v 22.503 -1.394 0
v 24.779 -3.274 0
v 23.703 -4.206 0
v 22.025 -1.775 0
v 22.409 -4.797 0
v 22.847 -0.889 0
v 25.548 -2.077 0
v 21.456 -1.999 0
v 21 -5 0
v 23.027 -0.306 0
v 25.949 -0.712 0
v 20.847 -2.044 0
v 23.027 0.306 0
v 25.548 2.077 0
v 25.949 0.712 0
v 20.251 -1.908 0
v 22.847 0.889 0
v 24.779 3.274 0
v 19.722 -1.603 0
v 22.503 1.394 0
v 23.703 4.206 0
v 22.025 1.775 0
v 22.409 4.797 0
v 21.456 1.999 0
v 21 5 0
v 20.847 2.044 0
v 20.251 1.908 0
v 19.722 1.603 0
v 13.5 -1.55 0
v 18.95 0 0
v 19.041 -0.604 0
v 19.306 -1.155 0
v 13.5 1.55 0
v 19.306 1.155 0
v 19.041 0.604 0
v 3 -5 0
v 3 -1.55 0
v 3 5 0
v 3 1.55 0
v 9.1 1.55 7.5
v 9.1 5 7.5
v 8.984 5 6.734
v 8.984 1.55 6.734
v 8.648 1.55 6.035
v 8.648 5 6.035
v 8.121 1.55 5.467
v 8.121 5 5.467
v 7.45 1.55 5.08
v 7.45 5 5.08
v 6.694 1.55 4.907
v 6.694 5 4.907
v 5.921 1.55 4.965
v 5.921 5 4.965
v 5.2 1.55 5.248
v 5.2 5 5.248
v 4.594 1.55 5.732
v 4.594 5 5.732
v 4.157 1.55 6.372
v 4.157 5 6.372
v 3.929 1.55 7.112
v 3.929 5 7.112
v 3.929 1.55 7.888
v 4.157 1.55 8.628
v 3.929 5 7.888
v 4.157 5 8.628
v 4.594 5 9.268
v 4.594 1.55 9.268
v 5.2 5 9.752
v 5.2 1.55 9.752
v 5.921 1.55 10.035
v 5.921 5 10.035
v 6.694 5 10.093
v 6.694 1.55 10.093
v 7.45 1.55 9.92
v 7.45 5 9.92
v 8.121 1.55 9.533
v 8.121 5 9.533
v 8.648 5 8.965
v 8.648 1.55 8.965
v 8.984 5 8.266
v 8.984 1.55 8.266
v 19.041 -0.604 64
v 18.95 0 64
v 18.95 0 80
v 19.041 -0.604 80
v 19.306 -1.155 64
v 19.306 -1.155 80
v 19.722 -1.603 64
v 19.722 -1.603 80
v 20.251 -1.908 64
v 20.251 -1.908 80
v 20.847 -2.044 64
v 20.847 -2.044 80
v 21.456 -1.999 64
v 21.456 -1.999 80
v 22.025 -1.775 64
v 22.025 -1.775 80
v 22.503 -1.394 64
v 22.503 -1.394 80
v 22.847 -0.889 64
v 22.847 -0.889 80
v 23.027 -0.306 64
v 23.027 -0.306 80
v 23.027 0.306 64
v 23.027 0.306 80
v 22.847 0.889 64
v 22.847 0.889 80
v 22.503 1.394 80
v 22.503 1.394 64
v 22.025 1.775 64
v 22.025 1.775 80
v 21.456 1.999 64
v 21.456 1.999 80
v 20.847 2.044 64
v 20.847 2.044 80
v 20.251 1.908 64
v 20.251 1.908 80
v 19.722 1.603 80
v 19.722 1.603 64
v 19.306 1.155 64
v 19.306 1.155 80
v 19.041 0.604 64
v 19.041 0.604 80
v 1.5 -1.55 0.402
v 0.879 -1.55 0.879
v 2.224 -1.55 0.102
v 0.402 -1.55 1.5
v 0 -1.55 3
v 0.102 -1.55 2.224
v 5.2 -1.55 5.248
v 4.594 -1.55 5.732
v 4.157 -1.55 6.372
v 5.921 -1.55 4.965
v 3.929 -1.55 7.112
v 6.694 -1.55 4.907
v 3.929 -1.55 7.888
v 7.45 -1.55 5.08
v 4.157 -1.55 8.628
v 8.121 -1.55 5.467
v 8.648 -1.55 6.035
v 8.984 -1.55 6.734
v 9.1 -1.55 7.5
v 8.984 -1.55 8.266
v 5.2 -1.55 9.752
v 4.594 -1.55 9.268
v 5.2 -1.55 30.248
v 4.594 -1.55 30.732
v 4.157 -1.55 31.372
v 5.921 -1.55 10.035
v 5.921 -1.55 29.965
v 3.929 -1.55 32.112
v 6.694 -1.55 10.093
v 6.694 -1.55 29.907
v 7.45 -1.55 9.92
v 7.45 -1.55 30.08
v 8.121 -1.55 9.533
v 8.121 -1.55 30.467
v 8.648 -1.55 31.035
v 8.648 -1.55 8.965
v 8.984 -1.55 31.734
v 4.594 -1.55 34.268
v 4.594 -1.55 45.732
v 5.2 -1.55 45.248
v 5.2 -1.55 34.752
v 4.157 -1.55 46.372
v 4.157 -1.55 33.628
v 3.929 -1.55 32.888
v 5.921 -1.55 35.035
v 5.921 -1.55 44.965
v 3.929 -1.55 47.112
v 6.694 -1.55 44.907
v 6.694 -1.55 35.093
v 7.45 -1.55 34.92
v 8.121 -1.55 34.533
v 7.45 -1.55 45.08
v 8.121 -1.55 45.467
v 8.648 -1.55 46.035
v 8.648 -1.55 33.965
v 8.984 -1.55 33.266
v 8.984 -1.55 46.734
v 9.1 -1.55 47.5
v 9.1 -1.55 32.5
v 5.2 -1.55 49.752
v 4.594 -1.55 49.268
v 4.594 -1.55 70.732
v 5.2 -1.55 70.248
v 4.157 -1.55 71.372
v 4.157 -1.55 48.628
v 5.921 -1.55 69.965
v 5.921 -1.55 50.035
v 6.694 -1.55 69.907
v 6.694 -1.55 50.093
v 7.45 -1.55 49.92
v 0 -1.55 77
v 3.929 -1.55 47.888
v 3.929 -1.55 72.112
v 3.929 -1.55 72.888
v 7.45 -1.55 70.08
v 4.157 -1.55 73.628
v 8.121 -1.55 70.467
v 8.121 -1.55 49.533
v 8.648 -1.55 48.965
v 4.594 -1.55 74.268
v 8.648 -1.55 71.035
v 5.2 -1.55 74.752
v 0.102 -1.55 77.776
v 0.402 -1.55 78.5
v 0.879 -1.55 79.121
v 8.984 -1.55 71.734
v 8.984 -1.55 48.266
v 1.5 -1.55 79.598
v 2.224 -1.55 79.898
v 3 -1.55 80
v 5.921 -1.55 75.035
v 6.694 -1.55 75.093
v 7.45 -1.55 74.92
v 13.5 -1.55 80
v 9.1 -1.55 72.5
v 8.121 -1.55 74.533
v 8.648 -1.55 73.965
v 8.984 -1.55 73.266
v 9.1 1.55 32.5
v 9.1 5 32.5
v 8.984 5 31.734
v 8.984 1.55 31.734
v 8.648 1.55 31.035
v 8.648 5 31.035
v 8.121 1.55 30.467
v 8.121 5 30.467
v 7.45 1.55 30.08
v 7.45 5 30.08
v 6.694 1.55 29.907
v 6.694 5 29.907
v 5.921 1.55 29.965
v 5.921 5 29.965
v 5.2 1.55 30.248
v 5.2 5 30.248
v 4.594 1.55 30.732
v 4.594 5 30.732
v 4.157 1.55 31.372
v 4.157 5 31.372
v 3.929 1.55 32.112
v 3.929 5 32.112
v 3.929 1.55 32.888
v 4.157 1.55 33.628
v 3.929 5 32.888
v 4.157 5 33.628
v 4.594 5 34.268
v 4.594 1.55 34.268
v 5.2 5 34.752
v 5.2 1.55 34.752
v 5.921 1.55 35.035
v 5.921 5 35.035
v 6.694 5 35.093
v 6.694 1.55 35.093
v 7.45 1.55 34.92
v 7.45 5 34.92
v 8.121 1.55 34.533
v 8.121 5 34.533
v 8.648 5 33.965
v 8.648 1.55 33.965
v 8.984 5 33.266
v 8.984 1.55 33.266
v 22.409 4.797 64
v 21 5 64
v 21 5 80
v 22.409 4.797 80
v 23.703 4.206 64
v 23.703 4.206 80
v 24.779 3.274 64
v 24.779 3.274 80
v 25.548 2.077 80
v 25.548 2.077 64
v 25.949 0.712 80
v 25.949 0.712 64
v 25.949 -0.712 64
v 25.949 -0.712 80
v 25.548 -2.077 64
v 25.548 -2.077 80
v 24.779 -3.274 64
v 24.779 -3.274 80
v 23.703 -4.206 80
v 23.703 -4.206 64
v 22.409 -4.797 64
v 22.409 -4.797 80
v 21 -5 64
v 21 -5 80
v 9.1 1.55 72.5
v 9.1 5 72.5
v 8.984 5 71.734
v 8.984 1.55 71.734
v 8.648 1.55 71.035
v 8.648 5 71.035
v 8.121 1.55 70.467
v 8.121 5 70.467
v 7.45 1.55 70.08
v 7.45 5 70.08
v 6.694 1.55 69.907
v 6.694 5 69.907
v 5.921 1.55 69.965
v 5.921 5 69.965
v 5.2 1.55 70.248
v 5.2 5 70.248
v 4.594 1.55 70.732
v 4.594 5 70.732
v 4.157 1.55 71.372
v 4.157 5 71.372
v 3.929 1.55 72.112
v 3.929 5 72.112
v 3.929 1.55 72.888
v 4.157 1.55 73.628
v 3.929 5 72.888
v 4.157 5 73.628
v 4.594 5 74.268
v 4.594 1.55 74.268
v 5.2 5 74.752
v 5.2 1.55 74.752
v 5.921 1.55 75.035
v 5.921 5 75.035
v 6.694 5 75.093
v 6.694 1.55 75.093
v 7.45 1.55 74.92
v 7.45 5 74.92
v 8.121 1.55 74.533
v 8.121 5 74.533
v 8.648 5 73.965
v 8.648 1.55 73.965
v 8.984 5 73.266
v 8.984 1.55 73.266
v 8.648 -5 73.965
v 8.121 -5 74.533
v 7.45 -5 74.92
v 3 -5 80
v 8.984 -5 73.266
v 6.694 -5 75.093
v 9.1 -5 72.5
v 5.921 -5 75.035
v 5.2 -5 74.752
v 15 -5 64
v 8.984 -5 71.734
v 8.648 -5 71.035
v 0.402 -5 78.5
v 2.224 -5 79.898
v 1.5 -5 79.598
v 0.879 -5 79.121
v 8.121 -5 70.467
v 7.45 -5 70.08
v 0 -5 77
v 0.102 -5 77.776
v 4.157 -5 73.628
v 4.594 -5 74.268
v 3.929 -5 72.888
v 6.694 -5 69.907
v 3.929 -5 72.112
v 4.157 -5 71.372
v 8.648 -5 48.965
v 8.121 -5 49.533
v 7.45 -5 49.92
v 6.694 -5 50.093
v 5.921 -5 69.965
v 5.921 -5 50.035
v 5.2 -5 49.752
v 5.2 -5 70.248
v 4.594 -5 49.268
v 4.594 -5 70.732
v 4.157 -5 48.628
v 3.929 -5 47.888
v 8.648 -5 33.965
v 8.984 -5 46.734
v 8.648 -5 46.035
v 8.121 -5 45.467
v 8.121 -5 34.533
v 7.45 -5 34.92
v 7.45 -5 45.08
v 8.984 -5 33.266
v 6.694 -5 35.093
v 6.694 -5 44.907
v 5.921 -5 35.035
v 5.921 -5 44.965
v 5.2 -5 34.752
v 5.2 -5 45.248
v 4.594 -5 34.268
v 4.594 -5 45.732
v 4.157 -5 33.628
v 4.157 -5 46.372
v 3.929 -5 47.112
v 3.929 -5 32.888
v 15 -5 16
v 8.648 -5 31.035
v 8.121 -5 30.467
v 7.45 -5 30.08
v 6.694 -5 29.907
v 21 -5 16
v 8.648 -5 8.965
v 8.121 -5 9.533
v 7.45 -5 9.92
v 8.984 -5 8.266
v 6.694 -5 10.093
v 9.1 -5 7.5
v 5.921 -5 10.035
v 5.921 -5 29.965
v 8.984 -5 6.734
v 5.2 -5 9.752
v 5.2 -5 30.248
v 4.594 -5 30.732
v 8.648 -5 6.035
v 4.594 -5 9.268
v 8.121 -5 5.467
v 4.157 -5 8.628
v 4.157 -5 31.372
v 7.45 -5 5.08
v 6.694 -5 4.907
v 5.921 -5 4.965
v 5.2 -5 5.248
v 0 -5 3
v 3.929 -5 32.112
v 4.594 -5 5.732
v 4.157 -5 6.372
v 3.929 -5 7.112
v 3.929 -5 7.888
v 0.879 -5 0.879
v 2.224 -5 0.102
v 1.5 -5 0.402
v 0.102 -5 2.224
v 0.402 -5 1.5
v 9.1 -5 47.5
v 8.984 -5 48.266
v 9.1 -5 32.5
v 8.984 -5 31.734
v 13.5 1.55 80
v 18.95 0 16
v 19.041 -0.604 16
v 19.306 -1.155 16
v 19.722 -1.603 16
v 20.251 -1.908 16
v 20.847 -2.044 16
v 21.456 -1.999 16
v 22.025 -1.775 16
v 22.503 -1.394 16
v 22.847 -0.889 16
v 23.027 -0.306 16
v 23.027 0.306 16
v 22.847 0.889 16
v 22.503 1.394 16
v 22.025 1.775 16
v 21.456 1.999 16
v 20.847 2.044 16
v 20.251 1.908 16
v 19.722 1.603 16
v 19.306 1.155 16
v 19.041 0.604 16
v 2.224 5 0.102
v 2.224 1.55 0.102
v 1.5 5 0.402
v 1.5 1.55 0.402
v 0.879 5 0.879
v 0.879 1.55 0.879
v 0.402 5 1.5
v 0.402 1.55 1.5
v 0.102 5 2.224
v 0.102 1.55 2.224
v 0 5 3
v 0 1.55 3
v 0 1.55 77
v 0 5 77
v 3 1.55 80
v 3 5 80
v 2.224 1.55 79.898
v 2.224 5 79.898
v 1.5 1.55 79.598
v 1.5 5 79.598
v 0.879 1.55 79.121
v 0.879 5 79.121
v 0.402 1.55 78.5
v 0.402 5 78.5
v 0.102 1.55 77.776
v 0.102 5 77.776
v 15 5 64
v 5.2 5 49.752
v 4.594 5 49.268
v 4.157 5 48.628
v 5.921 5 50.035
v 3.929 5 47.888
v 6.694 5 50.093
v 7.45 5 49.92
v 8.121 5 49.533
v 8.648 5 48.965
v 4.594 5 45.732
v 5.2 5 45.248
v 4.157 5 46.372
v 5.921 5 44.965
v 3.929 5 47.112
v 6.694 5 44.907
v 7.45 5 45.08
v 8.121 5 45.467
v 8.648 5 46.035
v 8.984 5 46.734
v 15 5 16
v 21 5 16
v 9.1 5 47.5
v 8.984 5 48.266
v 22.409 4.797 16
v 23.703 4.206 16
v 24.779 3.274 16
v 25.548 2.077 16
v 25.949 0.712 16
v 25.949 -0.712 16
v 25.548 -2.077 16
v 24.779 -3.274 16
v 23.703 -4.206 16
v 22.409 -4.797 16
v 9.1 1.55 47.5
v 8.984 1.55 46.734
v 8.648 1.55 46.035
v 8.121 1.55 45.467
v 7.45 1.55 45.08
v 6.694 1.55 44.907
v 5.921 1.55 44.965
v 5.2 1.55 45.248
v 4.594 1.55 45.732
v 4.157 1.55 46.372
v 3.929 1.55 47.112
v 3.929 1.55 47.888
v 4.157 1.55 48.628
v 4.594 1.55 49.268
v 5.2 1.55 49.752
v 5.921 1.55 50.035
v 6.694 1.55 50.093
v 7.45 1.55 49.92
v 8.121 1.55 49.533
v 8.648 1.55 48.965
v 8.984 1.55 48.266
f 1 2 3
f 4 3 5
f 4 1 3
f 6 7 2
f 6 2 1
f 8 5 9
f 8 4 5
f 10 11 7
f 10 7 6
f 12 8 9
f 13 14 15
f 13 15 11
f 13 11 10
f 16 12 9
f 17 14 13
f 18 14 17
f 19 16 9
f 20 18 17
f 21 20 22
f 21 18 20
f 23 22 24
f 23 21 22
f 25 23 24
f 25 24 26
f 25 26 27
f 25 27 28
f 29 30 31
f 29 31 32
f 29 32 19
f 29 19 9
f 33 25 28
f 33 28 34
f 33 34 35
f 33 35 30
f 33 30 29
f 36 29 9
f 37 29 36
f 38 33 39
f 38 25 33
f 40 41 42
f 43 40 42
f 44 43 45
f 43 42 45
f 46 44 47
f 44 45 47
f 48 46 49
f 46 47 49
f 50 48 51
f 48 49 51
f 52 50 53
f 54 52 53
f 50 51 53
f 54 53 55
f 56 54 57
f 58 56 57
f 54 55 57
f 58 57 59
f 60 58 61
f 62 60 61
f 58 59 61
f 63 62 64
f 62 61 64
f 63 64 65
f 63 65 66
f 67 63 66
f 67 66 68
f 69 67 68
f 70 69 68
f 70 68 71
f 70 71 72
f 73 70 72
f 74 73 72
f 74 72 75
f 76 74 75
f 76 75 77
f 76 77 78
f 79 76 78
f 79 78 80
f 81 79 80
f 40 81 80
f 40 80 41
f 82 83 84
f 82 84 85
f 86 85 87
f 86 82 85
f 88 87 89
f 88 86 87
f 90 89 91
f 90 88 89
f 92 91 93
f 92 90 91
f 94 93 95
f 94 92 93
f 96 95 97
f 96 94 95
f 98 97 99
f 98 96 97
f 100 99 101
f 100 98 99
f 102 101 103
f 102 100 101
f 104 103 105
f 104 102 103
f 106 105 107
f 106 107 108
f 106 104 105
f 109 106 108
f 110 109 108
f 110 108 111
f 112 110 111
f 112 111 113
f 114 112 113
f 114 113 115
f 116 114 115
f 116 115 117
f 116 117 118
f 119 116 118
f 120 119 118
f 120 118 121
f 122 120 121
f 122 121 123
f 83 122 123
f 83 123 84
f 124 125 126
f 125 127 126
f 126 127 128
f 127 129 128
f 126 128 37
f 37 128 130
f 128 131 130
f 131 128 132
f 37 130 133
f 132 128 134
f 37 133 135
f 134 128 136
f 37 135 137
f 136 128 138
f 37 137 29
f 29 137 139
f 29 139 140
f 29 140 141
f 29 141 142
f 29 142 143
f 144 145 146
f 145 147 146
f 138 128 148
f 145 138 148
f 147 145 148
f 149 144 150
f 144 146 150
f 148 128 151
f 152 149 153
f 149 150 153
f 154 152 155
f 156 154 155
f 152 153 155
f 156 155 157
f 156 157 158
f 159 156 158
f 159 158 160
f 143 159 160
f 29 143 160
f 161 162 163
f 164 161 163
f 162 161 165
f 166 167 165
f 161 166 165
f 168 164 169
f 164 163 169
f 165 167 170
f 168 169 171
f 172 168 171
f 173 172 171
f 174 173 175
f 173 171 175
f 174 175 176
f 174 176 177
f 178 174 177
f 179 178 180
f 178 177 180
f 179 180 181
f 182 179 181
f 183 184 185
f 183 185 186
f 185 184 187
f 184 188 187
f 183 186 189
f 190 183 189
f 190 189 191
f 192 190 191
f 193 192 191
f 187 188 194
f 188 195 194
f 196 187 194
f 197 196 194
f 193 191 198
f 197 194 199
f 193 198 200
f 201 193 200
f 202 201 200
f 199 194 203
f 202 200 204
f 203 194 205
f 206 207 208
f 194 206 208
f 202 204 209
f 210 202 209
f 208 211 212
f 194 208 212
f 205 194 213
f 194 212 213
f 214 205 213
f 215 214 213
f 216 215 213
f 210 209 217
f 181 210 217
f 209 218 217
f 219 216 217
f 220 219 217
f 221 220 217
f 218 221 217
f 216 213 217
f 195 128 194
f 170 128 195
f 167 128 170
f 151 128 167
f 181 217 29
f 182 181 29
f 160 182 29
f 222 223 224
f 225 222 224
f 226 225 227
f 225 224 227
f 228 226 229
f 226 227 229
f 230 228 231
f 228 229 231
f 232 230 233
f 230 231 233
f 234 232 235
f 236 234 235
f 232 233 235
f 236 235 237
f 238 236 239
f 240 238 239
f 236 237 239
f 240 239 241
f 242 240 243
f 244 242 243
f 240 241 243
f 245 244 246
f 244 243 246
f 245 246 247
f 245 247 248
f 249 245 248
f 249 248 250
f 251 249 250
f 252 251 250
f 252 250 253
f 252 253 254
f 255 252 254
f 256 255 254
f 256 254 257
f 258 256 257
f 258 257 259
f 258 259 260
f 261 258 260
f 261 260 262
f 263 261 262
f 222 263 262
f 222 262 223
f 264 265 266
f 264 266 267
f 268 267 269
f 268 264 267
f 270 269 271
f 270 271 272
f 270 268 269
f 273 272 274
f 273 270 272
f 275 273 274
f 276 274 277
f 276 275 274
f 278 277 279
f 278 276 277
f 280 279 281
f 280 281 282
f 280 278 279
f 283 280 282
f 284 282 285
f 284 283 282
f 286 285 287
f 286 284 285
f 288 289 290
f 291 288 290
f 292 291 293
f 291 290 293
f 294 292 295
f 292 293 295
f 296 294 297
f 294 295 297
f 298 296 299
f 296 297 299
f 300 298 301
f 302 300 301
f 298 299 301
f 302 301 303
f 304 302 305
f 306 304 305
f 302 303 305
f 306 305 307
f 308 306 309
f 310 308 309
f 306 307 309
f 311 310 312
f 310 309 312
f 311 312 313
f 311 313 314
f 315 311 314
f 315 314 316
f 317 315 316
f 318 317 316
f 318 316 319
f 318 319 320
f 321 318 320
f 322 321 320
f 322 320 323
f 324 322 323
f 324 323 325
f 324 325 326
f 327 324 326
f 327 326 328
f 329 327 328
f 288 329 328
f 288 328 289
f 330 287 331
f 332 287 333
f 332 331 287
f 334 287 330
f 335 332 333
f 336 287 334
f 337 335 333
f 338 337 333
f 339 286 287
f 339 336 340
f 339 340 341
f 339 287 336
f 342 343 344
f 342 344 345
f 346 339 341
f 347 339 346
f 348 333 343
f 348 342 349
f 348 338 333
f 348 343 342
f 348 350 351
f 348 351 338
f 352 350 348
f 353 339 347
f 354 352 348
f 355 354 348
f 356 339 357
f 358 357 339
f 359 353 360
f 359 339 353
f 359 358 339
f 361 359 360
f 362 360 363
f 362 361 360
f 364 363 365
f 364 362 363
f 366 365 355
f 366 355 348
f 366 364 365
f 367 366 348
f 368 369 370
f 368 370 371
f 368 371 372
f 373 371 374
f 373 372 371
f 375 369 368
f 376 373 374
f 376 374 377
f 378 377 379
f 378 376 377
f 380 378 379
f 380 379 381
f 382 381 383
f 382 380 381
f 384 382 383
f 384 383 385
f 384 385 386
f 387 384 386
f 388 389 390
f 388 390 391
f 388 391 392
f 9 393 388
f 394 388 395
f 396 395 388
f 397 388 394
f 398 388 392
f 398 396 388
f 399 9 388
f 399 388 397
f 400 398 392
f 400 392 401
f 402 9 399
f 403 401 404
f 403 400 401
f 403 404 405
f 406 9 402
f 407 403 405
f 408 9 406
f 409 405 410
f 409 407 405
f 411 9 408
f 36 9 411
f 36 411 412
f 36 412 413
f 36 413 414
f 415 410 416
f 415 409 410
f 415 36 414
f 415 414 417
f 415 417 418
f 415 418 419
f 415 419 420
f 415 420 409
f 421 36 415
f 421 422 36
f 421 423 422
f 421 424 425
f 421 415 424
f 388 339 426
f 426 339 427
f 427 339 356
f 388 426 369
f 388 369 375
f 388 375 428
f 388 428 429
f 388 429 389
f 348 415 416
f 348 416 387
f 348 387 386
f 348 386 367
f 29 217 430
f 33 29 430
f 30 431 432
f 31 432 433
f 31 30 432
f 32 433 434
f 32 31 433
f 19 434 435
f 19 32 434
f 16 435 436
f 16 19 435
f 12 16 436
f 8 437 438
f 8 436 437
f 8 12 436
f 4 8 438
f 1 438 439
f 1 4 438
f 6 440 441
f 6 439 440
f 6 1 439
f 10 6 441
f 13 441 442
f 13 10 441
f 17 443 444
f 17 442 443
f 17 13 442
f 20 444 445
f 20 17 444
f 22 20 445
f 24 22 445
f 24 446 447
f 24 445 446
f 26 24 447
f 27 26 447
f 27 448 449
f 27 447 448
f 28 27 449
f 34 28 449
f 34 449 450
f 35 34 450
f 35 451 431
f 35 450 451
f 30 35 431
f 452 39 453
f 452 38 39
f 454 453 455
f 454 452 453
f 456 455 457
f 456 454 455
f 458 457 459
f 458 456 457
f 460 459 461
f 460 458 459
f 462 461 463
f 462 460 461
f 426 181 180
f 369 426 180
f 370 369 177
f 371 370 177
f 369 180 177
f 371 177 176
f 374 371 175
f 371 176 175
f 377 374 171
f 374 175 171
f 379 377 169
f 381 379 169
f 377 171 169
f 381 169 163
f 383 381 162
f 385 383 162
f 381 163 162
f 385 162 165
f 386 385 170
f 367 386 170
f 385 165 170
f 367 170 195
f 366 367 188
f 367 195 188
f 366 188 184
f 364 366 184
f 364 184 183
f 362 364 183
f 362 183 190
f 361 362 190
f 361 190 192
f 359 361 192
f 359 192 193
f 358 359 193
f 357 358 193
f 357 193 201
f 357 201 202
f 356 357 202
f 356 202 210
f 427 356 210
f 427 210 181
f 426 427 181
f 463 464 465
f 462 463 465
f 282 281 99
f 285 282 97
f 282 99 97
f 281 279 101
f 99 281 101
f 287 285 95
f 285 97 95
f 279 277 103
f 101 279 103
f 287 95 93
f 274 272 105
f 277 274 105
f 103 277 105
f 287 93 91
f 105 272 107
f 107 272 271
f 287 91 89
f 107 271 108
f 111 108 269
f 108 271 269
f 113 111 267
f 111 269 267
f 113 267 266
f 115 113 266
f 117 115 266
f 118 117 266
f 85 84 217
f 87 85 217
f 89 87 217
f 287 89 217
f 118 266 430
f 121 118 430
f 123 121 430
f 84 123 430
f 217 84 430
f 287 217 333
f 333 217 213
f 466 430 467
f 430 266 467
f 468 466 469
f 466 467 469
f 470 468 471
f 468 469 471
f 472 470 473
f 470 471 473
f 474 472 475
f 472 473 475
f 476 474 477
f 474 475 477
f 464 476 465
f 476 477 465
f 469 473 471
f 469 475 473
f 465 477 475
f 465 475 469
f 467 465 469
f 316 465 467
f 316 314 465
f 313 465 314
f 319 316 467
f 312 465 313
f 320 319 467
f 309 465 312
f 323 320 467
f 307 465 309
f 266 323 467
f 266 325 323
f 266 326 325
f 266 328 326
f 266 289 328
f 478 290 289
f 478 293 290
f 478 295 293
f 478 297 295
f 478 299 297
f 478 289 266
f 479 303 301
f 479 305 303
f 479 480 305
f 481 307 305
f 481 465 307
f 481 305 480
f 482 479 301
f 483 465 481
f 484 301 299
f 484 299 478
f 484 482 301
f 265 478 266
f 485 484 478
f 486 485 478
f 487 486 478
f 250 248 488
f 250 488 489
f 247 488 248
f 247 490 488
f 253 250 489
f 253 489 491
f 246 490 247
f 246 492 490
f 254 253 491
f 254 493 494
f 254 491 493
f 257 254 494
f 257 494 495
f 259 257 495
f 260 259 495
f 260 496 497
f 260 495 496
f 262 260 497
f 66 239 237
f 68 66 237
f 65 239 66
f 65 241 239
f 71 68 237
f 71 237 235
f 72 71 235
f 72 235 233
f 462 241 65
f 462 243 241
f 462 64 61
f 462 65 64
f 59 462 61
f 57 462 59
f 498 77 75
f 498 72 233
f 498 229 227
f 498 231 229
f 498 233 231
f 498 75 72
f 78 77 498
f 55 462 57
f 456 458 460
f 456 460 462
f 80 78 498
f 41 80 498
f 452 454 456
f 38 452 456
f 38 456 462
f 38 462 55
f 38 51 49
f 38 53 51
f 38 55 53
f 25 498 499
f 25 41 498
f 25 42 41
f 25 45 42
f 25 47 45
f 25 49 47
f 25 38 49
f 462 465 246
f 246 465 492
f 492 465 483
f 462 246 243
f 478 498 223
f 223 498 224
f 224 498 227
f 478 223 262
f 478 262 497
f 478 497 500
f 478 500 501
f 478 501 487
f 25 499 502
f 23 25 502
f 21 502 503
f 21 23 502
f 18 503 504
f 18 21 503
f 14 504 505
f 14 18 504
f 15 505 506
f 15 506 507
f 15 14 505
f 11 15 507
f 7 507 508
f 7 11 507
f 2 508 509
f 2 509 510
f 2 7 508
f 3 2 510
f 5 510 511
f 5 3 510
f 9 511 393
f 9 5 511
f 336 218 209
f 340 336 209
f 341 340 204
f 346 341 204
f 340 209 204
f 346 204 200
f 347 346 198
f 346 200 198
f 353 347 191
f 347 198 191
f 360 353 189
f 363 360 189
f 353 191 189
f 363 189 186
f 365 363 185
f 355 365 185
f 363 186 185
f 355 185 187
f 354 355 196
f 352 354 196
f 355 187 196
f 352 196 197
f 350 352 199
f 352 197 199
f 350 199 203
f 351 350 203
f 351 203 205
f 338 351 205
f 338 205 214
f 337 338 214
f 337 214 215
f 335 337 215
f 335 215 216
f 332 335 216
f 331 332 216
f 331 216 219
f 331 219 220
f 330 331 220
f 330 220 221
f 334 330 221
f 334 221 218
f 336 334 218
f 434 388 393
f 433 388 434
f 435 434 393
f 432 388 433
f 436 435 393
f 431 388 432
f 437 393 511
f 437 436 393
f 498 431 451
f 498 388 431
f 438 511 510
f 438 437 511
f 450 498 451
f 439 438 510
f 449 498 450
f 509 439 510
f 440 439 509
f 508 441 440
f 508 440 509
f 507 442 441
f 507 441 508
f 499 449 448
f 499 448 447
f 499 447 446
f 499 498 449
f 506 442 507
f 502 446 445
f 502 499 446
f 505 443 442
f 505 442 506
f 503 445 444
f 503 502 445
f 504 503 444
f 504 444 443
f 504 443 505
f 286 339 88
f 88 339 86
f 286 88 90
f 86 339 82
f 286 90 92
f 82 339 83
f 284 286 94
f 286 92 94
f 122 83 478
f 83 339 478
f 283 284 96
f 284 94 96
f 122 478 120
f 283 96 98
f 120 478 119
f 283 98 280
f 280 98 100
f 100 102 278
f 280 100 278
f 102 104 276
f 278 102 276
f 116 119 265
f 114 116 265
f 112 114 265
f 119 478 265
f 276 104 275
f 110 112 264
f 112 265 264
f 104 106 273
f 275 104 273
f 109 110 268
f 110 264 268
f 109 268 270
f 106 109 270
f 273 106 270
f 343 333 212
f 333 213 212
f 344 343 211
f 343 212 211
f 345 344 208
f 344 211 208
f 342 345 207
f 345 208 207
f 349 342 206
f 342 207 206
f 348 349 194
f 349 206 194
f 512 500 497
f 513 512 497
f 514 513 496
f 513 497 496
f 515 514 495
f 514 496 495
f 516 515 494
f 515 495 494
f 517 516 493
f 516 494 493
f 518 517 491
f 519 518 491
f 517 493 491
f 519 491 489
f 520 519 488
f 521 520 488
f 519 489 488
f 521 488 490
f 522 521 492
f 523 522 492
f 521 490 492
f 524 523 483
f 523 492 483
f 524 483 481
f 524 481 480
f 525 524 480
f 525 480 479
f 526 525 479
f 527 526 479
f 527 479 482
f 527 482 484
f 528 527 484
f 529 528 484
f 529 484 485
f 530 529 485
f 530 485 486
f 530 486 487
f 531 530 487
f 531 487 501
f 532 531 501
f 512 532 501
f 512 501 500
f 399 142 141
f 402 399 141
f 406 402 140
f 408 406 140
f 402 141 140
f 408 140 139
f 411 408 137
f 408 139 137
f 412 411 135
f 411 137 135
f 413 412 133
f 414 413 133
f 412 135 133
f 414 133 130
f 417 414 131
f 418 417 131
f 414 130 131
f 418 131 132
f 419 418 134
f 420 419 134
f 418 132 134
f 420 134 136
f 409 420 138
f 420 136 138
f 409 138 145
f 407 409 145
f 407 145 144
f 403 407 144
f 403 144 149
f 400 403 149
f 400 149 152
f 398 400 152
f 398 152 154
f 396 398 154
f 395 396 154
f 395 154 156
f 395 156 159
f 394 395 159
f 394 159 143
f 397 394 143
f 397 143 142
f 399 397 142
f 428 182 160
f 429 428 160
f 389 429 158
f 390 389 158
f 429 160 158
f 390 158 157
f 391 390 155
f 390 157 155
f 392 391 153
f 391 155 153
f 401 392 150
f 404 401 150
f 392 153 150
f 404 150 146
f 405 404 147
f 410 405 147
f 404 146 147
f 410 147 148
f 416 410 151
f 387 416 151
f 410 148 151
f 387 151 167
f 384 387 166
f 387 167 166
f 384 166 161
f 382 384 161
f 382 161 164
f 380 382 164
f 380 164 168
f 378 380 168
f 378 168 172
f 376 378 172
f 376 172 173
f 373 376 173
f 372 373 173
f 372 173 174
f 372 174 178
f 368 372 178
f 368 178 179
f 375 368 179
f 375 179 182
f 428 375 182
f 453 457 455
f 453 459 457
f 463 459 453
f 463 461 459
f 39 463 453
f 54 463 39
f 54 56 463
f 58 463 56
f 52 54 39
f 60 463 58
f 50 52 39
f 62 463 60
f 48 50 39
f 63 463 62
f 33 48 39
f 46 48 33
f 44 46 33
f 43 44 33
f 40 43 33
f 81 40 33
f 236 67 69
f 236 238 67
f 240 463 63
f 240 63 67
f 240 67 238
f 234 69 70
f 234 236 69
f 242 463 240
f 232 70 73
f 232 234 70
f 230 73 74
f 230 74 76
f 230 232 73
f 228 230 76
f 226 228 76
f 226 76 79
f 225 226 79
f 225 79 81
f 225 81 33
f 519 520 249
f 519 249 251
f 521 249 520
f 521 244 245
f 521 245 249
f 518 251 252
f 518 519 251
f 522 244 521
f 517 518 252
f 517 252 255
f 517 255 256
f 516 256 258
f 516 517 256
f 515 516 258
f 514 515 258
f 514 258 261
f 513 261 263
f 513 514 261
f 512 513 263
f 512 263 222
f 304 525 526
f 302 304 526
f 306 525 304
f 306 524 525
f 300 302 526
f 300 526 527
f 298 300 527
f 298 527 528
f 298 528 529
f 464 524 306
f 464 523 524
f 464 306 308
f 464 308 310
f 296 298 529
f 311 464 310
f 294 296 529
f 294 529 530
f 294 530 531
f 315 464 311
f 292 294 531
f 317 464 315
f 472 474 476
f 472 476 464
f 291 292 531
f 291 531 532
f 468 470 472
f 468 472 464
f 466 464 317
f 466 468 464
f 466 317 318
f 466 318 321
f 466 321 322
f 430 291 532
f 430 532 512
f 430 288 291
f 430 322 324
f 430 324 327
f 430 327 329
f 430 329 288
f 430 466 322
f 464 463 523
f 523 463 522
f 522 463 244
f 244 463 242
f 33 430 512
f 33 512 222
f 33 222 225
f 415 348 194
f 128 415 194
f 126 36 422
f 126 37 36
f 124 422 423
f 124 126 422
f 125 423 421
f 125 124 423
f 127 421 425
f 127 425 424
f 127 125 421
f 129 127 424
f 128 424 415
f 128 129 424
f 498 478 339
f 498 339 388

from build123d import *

# Parameters (mm, degrees)
SKETCH_1_R          = 2.05
EXTRUDE_1_DEPTH     = 80
SKETCH_2_W          = 13.5
SKETCH_2_H          = 3.1
CUT_EXTRUDE_1_DEPTH = 95
SKETCH_4_R          = 2.6
CUT_EXTRUDE_2_DEPTH = 20
SKETCH_5_W          = 32.115933716
SKETCH_5_H          = 48
CUT_EXTRUDE_5_DEPTH = 20
FILLET_1_R          = 3


with BuildPart() as part:
    # 草图1 → 凸台-拉伸1 (new body)
    with BuildSketch(Plane.XY):
        with BuildLine():
            Line((0, 5), (21, 5))
            ThreePointArc((21, 5), (26, 0), (21, -5))
            Line((21, -5), (0, -5))
            Line((0, -5), (0, 5))
        make_face()
        with Locations(Location((21, 0, 0), (0, 0, 180))):
            Circle(SKETCH_1_R, mode=Mode.SUBTRACT)
    extrude(amount=EXTRUDE_1_DEPTH)

    # 草图2 → 切除-拉伸1 (cut)
    with BuildSketch(Plane.XY.offset(80)):
        with Locations((6.75, 0)):
            Rectangle(SKETCH_2_W, SKETCH_2_H)
    extrude(amount=-CUT_EXTRUDE_1_DEPTH, mode=Mode.SUBTRACT)

    # 草图4 → 切除-拉伸2 (cut)
    with BuildSketch(Plane(origin=(0, 5, 0), x_dir=(1, 0, 0), z_dir=(0, 1, 0))):
        with Locations((6.5, -32.5)):
            Circle(SKETCH_4_R)
        with Locations((6.5, -7.5)):
            Circle(SKETCH_4_R)
        with Locations((6.5, -72.5)):
            Circle(SKETCH_4_R)
        with Locations((6.5, -47.5)):
            Circle(SKETCH_4_R)
    extrude(amount=-CUT_EXTRUDE_2_DEPTH, mode=Mode.SUBTRACT)

    # 草图5 → 切除-拉伸5 (cut)
    with BuildSketch(Plane(origin=(0, 5, 0), x_dir=(1, 0, 0), z_dir=(0, 1, 0))):
        with Locations((31.057966858, -40)):
            Rectangle(SKETCH_5_W, SKETCH_5_H)
    extrude(amount=-CUT_EXTRUDE_5_DEPTH, mode=Mode.SUBTRACT)

    # 圆角1
    fillet_1_edges = [part.edges().sort_by_distance(p)[0] for p in [
        (0, -3.275, 0),
        (0, -3.275, 80),
        (0, 3.275, 80),
        (0, 3.275, 0),
    ]]
    fillet(fillet_1_edges, radius=FILLET_1_R)


solid = part.part
